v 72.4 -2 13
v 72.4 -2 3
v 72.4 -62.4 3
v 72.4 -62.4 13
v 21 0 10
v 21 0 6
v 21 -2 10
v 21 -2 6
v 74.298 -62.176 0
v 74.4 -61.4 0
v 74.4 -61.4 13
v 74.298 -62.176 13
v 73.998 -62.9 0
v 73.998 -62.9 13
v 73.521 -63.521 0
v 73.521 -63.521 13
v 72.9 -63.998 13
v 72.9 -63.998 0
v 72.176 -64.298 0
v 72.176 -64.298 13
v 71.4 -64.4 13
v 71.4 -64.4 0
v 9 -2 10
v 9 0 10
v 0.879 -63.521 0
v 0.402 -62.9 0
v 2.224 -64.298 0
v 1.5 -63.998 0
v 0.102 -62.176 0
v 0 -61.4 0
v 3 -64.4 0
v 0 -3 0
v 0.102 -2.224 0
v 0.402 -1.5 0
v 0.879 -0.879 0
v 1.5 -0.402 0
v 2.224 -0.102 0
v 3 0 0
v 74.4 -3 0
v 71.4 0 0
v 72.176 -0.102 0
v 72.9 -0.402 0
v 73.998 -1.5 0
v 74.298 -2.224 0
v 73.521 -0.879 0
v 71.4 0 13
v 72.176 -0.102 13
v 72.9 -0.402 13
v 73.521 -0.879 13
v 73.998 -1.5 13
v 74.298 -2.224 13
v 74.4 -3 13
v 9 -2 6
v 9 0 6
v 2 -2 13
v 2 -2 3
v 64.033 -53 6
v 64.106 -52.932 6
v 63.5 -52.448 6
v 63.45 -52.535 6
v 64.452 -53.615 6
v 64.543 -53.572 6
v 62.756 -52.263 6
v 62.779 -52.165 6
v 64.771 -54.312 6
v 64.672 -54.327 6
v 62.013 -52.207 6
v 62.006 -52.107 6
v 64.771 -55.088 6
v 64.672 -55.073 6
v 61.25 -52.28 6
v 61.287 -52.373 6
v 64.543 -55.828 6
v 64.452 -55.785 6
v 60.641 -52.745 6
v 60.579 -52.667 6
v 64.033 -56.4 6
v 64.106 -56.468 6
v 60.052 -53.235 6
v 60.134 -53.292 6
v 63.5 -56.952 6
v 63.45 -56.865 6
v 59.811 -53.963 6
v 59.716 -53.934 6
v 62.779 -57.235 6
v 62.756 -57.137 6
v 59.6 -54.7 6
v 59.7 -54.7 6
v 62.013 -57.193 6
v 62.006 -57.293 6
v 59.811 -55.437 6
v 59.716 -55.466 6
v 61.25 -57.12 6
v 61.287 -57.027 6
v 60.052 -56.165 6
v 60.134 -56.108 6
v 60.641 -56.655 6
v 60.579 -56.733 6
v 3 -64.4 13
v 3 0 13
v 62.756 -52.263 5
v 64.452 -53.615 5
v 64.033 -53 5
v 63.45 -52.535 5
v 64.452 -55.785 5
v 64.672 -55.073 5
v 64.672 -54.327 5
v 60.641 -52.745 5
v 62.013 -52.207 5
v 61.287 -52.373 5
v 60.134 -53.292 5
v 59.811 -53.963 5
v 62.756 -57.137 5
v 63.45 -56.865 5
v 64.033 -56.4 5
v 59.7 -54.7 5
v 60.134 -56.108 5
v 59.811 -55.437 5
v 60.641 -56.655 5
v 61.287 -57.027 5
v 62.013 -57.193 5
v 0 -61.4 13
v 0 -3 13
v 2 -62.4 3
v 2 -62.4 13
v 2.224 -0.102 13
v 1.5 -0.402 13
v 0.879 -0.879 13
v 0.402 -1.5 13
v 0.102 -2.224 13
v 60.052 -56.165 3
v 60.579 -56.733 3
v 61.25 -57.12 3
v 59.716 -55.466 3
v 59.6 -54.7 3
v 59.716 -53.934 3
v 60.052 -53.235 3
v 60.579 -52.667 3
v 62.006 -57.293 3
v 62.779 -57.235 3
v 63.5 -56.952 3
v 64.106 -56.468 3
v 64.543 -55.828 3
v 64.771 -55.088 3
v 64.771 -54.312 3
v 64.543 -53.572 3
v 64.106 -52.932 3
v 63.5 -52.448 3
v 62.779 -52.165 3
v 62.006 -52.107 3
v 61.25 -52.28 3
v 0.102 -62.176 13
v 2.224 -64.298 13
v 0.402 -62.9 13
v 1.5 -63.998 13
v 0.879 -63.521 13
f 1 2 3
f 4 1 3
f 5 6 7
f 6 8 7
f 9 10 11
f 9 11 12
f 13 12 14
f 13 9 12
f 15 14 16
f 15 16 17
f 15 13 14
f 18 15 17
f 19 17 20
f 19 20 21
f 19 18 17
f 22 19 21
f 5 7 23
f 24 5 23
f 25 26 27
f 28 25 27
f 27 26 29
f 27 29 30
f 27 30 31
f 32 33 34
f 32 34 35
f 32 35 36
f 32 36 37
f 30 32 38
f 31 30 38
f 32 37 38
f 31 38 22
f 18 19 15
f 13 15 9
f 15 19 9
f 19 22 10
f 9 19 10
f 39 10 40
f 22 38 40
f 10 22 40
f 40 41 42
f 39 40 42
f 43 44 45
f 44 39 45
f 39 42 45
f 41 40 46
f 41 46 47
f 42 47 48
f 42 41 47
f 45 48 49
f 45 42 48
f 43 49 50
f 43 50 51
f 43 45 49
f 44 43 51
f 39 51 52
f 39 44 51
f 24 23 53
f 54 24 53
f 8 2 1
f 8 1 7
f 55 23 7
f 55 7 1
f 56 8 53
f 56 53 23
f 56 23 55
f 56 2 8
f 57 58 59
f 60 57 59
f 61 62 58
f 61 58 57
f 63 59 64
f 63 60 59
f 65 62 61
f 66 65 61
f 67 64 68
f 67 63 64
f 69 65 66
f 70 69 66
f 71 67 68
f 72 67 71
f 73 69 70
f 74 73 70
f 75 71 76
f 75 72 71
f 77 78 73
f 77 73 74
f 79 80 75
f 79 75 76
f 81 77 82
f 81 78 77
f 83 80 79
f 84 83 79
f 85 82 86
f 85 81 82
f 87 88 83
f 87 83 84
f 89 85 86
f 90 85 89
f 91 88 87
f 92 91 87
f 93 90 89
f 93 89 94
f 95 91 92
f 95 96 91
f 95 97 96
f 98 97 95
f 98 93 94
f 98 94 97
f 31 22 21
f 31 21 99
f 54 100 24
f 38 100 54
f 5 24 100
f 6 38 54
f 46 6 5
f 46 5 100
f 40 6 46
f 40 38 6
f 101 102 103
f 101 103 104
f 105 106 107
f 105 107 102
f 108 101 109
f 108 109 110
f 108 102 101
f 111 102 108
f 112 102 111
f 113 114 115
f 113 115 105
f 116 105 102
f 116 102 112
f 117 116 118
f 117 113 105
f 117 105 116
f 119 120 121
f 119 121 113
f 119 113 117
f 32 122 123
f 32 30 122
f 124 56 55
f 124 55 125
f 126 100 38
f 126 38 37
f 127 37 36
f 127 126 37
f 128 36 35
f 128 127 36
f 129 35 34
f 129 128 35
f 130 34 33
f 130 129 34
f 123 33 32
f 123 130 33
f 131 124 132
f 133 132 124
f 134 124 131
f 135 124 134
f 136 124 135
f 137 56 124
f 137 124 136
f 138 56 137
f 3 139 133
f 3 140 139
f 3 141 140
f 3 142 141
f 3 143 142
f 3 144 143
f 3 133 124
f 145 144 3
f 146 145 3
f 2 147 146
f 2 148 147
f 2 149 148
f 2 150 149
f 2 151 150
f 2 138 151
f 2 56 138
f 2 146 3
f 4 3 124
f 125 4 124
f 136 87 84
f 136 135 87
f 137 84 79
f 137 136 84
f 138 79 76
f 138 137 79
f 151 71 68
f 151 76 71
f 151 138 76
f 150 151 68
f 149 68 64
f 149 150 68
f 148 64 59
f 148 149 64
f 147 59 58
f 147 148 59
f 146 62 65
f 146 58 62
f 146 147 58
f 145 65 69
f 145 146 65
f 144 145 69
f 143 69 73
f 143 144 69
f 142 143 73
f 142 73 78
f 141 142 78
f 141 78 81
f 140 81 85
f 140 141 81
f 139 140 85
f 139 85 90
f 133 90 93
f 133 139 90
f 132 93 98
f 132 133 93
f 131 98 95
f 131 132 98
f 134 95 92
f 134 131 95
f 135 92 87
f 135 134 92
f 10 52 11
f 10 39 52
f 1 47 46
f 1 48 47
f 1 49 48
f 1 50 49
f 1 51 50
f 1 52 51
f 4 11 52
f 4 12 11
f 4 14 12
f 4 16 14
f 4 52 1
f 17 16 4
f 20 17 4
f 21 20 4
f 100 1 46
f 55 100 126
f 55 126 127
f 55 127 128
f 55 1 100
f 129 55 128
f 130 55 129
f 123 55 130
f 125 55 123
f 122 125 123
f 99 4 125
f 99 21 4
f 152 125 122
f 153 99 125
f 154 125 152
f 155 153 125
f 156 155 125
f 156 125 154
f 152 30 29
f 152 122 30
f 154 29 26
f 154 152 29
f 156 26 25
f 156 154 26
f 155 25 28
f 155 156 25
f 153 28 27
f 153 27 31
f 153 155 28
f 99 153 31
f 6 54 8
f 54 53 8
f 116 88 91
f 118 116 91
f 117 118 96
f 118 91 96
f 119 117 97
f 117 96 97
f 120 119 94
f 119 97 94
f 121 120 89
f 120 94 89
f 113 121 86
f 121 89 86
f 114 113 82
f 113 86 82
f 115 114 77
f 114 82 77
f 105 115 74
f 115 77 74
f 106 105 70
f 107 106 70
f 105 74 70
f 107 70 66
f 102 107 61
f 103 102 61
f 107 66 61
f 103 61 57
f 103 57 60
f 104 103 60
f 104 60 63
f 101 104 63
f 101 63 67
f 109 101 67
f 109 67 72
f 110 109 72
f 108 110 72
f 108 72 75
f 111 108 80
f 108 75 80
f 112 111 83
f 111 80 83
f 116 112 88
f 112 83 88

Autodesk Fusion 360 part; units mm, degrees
sketch "Sketch3" plane through (0, 0, 0) normal (0, 0, 1) x (1, 0, 0)
  line L0 (0, 0) -> (74.4, 0)
  line L1 (74.4, 0) -> (74.4, -64.4)
  line L2 (74.4, -64.4) -> (0, -64.4)
  line L3 (0, -64.4) -> (0, 0)
  dimension "d8" = 74.4
  dimension "d9" = 64.4
extrude "Extrude2" add sketch "Sketch3" along normal blind 3
sketch "Sketch4" plane through (0, 0, 3) normal (0, 0, 1) x (-1, 0, 0)
  line L0 (0, 64.4) -> (-74.4, 64.4)
  line L1 (-74.4, 64.4) -> (-74.4, 0)
  line L2 (-74.4, 0) -> (0, 0)
  line L3 (0, 0) -> (0, 64.4)
  line L4 (0, 0) -> (-74.4, 0)
  line L5 (-74.4, 0) -> (-74.4, 2)
  line L6 (-74.4, 2) -> (0, 2)
  line L7 (0, 2) -> (0, 0)
  line L8 (-74.4, 0) -> (-72.4, 0)
  line L9 (-72.4, 0) -> (-72.4, 64.4)
  line L10 (-72.4, 64.4) -> (-74.4, 64.4)
  line L11 (-74.4, 64.4) -> (-74.4, 0)
  line L12 (0, 0) -> (-2, 0)
  line L13 (-2, 0) -> (-2, 64.4)
  line L14 (-2, 64.4) -> (0, 64.4)
  line L15 (0, 64.4) -> (0, 0)
  line L16 (0, 64.4) -> (-74.4, 64.4)
  line L17 (-74.4, 64.4) -> (-74.4, 62.4)
  line L18 (-74.4, 62.4) -> (0, 62.4)
  line L19 (0, 62.4) -> (0, 64.4)
  dimension "d12" = 2
  dimension "d13" = 2
  dimension "d14" = 2
  dimension "d15" = 2
extrude "Extrude3" add sketch "Sketch4" along normal blind 10 contours L0 L3 L13 L14 L15 L16 L18 L19 | L0 L9 L13 L16 L18 | L3 L6 L13 L15 L18 | L0 L1 L9 L10 L11 L16 L17 L18 | L2 L3 L4 L6 L7 L12 L13 L15 | L1 L6 L9 L11 L18 | L2 L4 L6 L9 L13 | L1 L2 L4 L5 L6 L8 L9 L11
sketch "Sketch6" plane through (0, 0, 0) normal (0, 1, 0) x (-1, 0, 0)
  line L0 (-74.4, 0) -> (0, 0)
  line L1 (0, 0) -> (0, 13)
  line L2 (0, 13) -> (-74.4, 13)
  line L3 (-74.4, 13) -> (-74.4, 0)
  line L4 (-8.3, 5) -> (-22.3, 5)
  line L5 (-22.3, 5) -> (-22.3, 9)
  line L6 (-22.3, 9) -> (-8.3, 9)
  line L7 (-8.3, 9) -> (-8.3, 5)
  dimension "d23" = 14
  dimension "d24" = 8.3
  dimension "d25" = 5
fillet "Fillet1" radius 3 4 edges at (74.4, -64.4, 6.5) (74.4, 0, 6.5) (0, 0, 6.5) (0, -64.4, 6.5)
sketch "Sketch7" plane through (0, 0, 3) normal (0, 0, 1) x (-1, 0, 0)
  line L0 (-2, 62.4) -> (-72.4, 62.4)
  line L1 (-72.4, 62.4) -> (-72.4, 2)
  line L2 (-72.4, 2) -> (-2, 2)
  line L3 (-2, 2) -> (-2, 62.4)
  circle A0 centre (-62.2, 54.7) radius 2.6
  dimension "d30" = 5.2
  dimension "d31" = 10.2
  dimension "d32" = 7.7
extrude "Extrude5" add sketch "Sketch7" along normal blind 3 contours A0
sketch "Sketch8" plane through (0, 0, 6) normal (0, 0, 1) x (-1, 0, 0)
  circle A0 centre (-62.2, 54.7) radius 2.6
  circle A1 centre (-62.2, 54.7) radius 2.5
  dimension "d35" = 5
extrude "Extrude6" cut sketch "Sketch8" against normal blind 1 contours A1
sketch "Sketch10" plane through (0, -2, 0) normal (0, -1, 0) x (1, 0, 0)
  line L0 (2, 3) -> (72.4, 3)
  line L1 (72.4, 3) -> (72.4, 13)
  line L2 (72.4, 13) -> (2, 13)
  line L3 (2, 13) -> (2, 3)
  line L4 (9, 6) -> (21, 6)
  line L5 (21, 6) -> (21, 10)
  line L6 (21, 10) -> (9, 10)
  line L7 (9, 10) -> (9, 6)
  dimension "d46" = 12
  dimension "d47" = 4
  dimension "d48" = 3
  dimension "d49" = 7
extrude "Extrude8" cut sketch "Sketch10" against normal blind 3 contours L4 L5 L6 L7
